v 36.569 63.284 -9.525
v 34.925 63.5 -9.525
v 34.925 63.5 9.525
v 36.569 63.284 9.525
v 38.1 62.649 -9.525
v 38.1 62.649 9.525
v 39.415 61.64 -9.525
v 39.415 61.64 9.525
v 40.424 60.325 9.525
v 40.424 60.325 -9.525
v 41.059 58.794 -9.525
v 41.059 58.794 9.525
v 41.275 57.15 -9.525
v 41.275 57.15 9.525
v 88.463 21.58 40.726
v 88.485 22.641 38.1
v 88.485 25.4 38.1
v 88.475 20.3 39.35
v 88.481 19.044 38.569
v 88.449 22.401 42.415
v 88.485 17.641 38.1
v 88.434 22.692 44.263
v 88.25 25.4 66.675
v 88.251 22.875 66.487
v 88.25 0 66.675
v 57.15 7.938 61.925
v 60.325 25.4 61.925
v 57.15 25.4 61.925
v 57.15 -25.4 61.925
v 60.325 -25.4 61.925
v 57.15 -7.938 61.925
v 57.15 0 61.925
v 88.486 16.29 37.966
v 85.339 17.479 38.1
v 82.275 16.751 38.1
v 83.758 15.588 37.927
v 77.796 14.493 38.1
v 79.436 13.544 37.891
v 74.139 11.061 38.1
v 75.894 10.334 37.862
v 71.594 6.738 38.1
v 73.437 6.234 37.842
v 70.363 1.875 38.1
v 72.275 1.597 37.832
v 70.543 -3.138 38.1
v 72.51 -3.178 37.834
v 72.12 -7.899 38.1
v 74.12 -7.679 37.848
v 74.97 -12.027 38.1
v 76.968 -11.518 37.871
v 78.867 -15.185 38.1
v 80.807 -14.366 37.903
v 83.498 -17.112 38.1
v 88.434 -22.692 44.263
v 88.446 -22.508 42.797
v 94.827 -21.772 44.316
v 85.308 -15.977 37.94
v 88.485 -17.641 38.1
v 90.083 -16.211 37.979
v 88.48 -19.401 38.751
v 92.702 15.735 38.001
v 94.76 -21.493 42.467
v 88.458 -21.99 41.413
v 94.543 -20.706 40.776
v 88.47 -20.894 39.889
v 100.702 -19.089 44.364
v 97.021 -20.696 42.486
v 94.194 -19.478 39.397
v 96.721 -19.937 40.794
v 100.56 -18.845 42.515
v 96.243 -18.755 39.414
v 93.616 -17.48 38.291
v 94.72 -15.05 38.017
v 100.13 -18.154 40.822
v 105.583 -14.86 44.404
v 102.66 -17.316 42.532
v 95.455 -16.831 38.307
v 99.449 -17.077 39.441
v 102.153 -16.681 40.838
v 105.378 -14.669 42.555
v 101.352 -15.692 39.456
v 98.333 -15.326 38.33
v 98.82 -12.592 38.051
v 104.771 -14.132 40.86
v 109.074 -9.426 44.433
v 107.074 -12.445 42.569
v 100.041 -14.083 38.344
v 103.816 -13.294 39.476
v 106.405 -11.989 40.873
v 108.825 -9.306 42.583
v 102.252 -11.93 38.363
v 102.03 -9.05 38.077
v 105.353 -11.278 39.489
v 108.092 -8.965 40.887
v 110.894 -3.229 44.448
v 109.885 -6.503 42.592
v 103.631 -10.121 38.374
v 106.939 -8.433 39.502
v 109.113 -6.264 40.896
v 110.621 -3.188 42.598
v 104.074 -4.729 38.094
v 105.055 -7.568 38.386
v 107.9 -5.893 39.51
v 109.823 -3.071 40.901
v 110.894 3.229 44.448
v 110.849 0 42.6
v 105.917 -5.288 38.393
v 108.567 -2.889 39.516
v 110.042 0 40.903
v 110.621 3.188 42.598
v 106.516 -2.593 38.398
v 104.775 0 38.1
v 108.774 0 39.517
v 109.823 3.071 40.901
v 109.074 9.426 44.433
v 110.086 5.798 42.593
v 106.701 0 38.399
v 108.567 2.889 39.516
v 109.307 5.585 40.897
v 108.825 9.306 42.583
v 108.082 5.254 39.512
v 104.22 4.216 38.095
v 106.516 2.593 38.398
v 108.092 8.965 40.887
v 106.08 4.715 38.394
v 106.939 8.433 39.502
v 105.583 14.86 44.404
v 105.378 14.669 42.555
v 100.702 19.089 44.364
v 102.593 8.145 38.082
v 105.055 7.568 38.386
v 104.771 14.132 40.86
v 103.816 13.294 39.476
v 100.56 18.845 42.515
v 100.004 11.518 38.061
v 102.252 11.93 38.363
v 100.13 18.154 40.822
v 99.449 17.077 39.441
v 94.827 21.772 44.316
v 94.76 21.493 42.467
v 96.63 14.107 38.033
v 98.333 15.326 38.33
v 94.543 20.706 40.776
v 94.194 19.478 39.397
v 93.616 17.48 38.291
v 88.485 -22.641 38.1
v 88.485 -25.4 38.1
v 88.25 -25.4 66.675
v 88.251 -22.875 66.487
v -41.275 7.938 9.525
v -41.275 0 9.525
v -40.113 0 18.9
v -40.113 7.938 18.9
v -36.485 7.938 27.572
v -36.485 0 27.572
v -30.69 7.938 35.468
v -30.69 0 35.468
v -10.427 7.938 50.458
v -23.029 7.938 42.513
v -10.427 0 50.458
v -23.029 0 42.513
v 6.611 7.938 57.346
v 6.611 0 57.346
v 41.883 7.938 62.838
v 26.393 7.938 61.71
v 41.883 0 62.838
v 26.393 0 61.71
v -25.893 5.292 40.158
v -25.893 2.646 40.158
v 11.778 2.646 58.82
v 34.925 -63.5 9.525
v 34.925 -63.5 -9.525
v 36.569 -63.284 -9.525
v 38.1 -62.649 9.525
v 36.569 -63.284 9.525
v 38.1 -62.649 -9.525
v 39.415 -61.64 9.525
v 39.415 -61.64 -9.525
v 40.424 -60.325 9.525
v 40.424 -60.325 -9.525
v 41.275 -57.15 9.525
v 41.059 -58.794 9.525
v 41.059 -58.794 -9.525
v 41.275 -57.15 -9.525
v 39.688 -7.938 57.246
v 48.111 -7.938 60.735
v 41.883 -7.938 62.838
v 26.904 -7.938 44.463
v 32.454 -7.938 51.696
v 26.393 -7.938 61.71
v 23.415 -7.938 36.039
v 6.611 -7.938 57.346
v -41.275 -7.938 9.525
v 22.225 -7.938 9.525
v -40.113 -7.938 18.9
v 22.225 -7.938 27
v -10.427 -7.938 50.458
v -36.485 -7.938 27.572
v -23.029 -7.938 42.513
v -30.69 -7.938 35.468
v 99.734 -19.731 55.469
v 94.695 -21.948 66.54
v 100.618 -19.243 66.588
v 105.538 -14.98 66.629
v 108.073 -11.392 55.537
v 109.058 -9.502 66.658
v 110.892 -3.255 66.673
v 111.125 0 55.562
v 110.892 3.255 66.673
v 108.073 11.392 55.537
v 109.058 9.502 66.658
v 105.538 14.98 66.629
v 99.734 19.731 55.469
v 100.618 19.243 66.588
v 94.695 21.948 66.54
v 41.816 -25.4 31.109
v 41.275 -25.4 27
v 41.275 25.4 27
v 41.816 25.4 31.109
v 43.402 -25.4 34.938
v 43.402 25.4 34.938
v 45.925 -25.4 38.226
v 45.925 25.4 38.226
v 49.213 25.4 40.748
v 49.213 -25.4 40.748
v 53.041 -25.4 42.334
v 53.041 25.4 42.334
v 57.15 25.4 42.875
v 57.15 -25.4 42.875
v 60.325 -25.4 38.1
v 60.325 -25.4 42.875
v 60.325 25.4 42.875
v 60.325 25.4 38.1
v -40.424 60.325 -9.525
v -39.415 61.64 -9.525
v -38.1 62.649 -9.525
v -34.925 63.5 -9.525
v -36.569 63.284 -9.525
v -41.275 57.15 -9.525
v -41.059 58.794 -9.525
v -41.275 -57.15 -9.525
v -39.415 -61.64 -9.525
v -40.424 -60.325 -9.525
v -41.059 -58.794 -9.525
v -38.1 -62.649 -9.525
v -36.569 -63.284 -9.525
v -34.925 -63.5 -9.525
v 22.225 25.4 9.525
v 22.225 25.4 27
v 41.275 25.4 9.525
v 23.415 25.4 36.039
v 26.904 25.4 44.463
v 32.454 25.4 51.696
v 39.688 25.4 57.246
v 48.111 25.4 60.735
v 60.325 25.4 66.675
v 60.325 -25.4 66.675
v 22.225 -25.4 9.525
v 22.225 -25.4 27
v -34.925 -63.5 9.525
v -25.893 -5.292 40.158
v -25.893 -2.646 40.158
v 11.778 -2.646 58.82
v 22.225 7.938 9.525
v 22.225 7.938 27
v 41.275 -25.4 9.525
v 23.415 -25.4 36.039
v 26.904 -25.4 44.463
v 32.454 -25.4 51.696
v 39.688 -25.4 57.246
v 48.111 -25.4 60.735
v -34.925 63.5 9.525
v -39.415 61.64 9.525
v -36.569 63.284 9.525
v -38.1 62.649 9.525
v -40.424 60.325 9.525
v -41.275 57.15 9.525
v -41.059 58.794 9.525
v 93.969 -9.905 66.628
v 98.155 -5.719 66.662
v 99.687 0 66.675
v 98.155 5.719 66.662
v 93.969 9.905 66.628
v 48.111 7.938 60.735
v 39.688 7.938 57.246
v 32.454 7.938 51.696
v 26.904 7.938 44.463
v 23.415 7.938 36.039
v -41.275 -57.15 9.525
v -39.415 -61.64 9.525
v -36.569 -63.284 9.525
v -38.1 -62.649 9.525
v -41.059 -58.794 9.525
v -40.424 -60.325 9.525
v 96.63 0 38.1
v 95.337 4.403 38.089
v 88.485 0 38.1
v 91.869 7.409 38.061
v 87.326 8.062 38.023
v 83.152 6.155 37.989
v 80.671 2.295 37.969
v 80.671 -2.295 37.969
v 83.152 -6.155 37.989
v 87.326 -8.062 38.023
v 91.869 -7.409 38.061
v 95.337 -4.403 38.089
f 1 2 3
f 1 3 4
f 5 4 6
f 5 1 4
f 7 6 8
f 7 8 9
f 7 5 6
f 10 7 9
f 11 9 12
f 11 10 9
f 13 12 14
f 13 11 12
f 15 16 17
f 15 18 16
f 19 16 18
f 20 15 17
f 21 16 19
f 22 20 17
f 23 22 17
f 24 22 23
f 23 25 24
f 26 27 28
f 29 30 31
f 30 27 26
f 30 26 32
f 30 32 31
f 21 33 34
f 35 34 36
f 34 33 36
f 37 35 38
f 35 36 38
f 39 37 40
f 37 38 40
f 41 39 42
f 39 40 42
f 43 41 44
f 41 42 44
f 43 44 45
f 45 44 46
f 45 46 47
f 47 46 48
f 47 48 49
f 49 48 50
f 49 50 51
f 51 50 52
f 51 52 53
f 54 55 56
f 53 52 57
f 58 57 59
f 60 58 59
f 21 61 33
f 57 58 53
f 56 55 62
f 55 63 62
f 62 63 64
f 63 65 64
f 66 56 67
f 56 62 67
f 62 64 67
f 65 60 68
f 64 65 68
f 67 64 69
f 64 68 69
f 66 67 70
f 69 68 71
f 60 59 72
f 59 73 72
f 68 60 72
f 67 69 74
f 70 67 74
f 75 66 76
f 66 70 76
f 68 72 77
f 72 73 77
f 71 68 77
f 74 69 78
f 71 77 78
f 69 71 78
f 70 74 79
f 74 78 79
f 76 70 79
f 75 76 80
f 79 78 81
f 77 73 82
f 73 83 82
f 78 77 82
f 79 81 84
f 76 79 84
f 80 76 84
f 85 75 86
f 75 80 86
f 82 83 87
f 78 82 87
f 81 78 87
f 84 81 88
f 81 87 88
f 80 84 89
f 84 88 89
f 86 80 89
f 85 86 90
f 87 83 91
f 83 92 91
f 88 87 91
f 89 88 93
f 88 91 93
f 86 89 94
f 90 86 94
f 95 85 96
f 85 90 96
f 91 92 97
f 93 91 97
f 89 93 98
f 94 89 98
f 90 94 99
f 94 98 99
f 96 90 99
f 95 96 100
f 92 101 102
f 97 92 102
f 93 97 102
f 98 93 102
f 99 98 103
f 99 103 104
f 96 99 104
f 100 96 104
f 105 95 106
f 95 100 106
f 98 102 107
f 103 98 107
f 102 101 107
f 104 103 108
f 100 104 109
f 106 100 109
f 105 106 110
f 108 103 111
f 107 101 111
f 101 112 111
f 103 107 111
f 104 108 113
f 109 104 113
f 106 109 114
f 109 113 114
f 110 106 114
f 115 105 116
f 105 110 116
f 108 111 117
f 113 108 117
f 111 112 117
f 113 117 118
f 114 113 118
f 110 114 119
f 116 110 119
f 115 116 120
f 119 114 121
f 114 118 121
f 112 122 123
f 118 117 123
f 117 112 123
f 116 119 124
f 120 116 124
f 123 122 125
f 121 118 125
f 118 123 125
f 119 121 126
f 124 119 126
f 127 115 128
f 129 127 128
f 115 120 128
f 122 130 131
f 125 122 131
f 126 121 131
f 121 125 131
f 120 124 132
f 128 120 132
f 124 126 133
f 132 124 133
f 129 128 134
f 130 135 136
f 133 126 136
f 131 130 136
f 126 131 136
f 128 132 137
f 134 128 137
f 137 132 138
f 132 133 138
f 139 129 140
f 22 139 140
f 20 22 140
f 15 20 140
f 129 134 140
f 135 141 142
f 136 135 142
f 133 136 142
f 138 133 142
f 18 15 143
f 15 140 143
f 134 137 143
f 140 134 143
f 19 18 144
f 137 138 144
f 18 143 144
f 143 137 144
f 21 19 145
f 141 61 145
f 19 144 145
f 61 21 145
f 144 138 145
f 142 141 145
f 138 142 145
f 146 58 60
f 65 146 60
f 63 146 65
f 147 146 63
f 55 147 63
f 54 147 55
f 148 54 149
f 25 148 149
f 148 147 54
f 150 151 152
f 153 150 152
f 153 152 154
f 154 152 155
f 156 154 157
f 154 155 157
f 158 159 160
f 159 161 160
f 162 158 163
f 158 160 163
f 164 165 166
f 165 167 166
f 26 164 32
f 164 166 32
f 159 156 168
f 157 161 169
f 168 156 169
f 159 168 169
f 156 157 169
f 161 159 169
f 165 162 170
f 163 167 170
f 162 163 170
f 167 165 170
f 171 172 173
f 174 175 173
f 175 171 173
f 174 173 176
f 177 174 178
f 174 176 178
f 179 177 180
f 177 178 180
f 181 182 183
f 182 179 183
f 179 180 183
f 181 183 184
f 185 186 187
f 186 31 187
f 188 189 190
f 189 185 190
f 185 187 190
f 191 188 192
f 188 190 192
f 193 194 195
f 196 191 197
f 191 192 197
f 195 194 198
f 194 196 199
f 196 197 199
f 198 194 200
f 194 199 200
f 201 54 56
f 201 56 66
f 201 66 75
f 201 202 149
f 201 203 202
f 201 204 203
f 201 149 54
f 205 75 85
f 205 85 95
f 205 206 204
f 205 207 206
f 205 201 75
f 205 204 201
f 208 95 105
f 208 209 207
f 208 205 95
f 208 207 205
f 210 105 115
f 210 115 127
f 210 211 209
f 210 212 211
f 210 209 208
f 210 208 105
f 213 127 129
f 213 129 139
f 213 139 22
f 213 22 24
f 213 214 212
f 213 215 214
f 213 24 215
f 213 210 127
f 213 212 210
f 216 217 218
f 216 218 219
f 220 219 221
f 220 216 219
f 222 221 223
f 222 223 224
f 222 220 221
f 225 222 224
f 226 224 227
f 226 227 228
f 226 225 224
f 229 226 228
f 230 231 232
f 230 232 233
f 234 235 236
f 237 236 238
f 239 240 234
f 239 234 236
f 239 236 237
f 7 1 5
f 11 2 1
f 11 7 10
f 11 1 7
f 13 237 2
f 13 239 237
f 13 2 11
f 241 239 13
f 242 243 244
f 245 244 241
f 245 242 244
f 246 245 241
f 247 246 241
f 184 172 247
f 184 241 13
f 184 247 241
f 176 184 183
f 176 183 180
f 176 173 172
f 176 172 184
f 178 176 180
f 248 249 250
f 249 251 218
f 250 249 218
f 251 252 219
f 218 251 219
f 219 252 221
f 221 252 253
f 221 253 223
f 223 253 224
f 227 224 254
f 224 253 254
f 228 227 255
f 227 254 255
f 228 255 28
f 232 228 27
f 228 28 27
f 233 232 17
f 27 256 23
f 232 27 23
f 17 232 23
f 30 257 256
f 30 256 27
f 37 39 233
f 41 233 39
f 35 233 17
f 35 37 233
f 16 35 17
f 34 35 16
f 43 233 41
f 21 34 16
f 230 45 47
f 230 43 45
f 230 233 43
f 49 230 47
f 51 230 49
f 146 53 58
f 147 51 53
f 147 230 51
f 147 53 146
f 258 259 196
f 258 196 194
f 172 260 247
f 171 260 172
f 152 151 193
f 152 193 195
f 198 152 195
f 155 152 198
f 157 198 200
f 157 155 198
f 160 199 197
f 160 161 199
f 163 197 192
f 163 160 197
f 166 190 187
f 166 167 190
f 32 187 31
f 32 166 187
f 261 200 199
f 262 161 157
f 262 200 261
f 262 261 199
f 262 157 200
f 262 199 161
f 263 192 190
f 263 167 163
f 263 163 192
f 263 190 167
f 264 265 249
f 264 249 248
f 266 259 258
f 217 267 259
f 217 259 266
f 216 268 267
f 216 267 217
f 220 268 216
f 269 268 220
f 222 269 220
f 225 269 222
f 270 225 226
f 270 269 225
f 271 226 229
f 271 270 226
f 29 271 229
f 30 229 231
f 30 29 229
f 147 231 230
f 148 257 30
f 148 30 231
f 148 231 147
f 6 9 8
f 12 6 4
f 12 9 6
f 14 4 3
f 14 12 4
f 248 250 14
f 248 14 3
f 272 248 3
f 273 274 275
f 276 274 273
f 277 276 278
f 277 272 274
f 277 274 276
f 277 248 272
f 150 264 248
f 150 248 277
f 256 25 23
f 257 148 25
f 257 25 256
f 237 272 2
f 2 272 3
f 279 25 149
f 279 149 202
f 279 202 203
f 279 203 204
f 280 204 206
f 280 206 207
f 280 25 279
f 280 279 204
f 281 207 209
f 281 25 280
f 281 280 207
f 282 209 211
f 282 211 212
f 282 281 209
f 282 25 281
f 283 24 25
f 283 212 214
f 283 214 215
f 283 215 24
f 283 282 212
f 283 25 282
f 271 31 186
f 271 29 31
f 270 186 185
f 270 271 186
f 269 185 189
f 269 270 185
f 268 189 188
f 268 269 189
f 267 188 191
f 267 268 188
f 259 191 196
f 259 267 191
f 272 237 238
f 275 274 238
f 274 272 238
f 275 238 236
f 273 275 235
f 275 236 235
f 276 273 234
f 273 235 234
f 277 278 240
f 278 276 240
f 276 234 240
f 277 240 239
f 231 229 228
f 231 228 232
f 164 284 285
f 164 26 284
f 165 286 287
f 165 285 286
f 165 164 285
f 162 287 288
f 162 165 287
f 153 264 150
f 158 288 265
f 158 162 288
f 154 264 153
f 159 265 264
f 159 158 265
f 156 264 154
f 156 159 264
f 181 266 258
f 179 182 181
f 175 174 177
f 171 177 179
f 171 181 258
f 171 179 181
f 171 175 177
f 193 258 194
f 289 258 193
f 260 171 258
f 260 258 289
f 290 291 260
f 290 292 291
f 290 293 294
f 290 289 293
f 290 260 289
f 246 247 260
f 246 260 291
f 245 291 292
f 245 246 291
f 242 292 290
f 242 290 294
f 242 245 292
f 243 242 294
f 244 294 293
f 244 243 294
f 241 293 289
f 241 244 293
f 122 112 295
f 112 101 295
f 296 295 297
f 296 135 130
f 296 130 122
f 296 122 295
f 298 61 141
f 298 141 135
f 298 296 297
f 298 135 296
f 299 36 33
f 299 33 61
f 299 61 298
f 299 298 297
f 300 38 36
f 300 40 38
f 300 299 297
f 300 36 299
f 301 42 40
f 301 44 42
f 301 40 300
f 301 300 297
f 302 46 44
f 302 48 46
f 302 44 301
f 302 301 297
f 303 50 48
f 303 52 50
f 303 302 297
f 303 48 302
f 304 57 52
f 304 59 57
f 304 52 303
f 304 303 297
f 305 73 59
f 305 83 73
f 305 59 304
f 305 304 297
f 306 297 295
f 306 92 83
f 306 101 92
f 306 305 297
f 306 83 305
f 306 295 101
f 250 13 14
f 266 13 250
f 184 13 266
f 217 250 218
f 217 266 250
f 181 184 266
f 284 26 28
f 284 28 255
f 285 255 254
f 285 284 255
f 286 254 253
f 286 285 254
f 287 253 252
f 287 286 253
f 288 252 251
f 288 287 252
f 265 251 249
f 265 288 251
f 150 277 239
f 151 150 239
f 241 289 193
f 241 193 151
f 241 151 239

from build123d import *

# Parameters (mm, degrees)
F1_DEPTH    = 63.5
F2_DEPTH    = 25.4
F3_DEPTH    = 7.9375
F5_T1_DEPTH = 50.8


# Not quite as in the source:
# - a fillet or chamfer that OpenCascade refuses, or shapes differently, is made with other operations: its cross-section is extruded or revolved along the edge and cut away or added


with BuildPart() as f1:
    # F0 (on Front) → F1 (new body, symmetric)
    with BuildSketch(Plane.XZ):
        Polygon((22.225, 9.525), (-41.275, 9.525), (-41.275, -9.525), (41.275, -9.525), (41.275, 9.525), align=None)
    extrude(amount=F1_DEPTH, both=True)

    # F0 (on Front) → F2 (join, symmetric)
    with BuildSketch(Plane.XZ):
        with BuildLine():
            Line((22.225, 27.0002), (22.225, 9.525))
            Line((22.225, 9.525), (41.275, 9.525))
            Line((41.275, 9.525), (41.275, 27.0002))
            ThreePointArc((41.275, 27.0002), (45.9246798487, 38.2255201513), (57.15, 42.8752))
            Line((57.15, 42.8752), (60.325, 42.8752))
            Line((60.325, 42.8752), (60.325, 61.9252))
            Line((60.325, 61.9252), (57.15, 61.9252))
            ThreePointArc((57.15, 61.9252), (32.4542956671, 51.6959043329), (22.225, 27.0002))
        make_face()
        Polygon((60.325, 66.675), (60.325, 61.9252), (60.325, 42.8752), (60.325, 38.1), (88.4848684072, 38.1), (88.2495848575, 66.675), align=None)
    extrude(amount=F2_DEPTH, both=True)

    # F0 (on Front) → F3 (join, symmetric)
    with BuildSketch(Plane.XZ):
        with BuildLine():
            add(Edge.make_bspline(
                [(-41.275, 9.525), (-41.8986715376, 44.9499189854), (12.7891246229, 67.7922144532), (57.15, 61.9252)],
                knots=[0, 0, 0, 0, 111.5045361635, 111.5045361635, 111.5045361635, 111.5045361635], degree=3))
            Line((-41.275, 9.525), (22.225, 9.525))
            Line((22.225, 9.525), (22.225, 27.0002))
            ThreePointArc((22.225, 27.0002), (32.4542956671, 51.6959043329), (57.15, 61.9252))
        make_face()
    extrude(amount=F3_DEPTH, both=True)

    # F0 (on Front) → F4 (revolve)
    with BuildSketch(Plane.XZ):
        Polygon((111.125, 66.675), (88.2495848575, 66.675), (88.4848684072, 38.1), (111.125, 38.1), align=None)
    revolve(axis=Axis((88.3672266324, 0, 52.3875), (-0.0082336159, 0, 0.9999661032)))

    # F5: fillet of radius 6.35 on 5 edges, made by hand

    # F5_s2 → F5_t1 (cut)
    with BuildSketch(Plane.XY.offset(-25.4)):
        with BuildLine():
            ThreePointArc((34.925, -63.5), (39.4151280605, -61.6401280605), (41.275, -57.15))
            Line((41.275, -57.15), (41.275, -63.5))
            Line((41.275, -63.5), (34.925, -63.5))
        make_face()
        with BuildLine():
            ThreePointArc((34.925, 63.5), (39.4151280605, 61.6401280605), (41.275, 57.15))
            Line((41.275, 57.15), (41.275, 63.5))
            Line((41.275, 63.5), (34.925, 63.5))
        make_face()
        with BuildLine():
            ThreePointArc((-34.925, 63.5), (-39.4151280605, 61.6401280605), (-41.275, 57.15))
            Line((-41.275, 57.15), (-41.275, 63.5))
            Line((-41.275, 63.5), (-34.925, 63.5))
        make_face()
        with BuildLine():
            ThreePointArc((-34.925, -63.5), (-39.4151280605, -61.6401280605), (-41.275, -57.15))
            Line((-41.275, -57.15), (-41.275, -63.5))
            Line((-41.275, -63.5), (-34.925, -63.5))
        make_face()
    extrude(amount=F5_T1_DEPTH, mode=Mode.SUBTRACT)


with BuildPart() as f5_tool4:
    # F5_s5 → F5_t6 (revolve)
    with BuildSketch(Plane.XZ):
        with BuildLine():
            ThreePointArc((111.125, 44.45), (109.2651280605, 39.9598719395), (104.775, 38.1))
            Line((104.775, 38.1), (111.125, 38.1))
            Line((111.125, 38.1), (111.125, 44.45))
        make_face()
    revolve(axis=Axis((88.4864032368, 0, 37.9135961712), (-0.0082336159, 0, 0.9999661032)))

    split(bisect_by=Plane(origin=(88.7925599353, 0, 0.7311086157), x_dir=(0, 1, 0), z_dir=(0.9999661032, 0, 0.0082336159)), keep=Keep.TOP)

    split(bisect_by=Plane.XY.offset(38.1), keep=Keep.TOP)


with BuildPart() as f1_1:
    add(f1.part)

    # F5_t3: cut F5_tool4
    add(f5_tool4.part, mode=Mode.SUBTRACT)


with BuildPart() as f5_tool10:
    # F5_s11 → F5_t12 (revolve)
    with BuildSketch(Plane.XZ):
        with BuildLine():
            ThreePointArc((111.125, 44.45), (109.2651280605, 39.9598719395), (104.775, 38.1))
            Line((104.775, 38.1), (111.125, 38.1))
            Line((111.125, 38.1), (111.125, 44.45))
        make_face()
    revolve(axis=Axis((88.4864032368, 0, 37.9135961712), (-0.0082336159, 0, 0.9999661032)))

    split(bisect_by=Plane(origin=(88.7925599353, 0, 0.7311086157), x_dir=(0, 1, 0), z_dir=(0.9999661032, 0, 0.0082336159)), keep=Keep.TOP)

    split(bisect_by=Plane.XY.offset(38.1), keep=Keep.BOTTOM)


with BuildPart() as f1_2:
    add(f1_1.part)

    # F5_t9: cut F5_tool10
    add(f5_tool10.part, mode=Mode.SUBTRACT)


with BuildPart() as f5_tool16:
    # F5_s17 → F5_t18 (revolve)
    with BuildSketch(Plane.XZ):
        with BuildLine():
            ThreePointArc((111.125, 44.45), (109.2651280605, 39.9598719395), (104.775, 38.1))
            Line((104.775, 38.1), (111.125, 38.1))
            Line((111.125, 38.1), (111.125, 44.45))
        make_face()
    revolve(axis=Axis((88.4864032368, 0, 37.9135961712), (-0.0082336159, 0, 0.9999661032)))

    split(bisect_by=Plane(origin=(88.7925599353, 0, 0.7311086157), x_dir=(0, 1, 0), z_dir=(-0.9999661032, 0, -0.0082336159)), keep=Keep.TOP)

    split(bisect_by=Plane.XY.offset(38.1), keep=Keep.BOTTOM)


with BuildPart() as f1_3:
    add(f1_2.part)

    # F5_t15: cut F5_tool16
    add(f5_tool16.part, mode=Mode.SUBTRACT)


solid = f1_3.part
